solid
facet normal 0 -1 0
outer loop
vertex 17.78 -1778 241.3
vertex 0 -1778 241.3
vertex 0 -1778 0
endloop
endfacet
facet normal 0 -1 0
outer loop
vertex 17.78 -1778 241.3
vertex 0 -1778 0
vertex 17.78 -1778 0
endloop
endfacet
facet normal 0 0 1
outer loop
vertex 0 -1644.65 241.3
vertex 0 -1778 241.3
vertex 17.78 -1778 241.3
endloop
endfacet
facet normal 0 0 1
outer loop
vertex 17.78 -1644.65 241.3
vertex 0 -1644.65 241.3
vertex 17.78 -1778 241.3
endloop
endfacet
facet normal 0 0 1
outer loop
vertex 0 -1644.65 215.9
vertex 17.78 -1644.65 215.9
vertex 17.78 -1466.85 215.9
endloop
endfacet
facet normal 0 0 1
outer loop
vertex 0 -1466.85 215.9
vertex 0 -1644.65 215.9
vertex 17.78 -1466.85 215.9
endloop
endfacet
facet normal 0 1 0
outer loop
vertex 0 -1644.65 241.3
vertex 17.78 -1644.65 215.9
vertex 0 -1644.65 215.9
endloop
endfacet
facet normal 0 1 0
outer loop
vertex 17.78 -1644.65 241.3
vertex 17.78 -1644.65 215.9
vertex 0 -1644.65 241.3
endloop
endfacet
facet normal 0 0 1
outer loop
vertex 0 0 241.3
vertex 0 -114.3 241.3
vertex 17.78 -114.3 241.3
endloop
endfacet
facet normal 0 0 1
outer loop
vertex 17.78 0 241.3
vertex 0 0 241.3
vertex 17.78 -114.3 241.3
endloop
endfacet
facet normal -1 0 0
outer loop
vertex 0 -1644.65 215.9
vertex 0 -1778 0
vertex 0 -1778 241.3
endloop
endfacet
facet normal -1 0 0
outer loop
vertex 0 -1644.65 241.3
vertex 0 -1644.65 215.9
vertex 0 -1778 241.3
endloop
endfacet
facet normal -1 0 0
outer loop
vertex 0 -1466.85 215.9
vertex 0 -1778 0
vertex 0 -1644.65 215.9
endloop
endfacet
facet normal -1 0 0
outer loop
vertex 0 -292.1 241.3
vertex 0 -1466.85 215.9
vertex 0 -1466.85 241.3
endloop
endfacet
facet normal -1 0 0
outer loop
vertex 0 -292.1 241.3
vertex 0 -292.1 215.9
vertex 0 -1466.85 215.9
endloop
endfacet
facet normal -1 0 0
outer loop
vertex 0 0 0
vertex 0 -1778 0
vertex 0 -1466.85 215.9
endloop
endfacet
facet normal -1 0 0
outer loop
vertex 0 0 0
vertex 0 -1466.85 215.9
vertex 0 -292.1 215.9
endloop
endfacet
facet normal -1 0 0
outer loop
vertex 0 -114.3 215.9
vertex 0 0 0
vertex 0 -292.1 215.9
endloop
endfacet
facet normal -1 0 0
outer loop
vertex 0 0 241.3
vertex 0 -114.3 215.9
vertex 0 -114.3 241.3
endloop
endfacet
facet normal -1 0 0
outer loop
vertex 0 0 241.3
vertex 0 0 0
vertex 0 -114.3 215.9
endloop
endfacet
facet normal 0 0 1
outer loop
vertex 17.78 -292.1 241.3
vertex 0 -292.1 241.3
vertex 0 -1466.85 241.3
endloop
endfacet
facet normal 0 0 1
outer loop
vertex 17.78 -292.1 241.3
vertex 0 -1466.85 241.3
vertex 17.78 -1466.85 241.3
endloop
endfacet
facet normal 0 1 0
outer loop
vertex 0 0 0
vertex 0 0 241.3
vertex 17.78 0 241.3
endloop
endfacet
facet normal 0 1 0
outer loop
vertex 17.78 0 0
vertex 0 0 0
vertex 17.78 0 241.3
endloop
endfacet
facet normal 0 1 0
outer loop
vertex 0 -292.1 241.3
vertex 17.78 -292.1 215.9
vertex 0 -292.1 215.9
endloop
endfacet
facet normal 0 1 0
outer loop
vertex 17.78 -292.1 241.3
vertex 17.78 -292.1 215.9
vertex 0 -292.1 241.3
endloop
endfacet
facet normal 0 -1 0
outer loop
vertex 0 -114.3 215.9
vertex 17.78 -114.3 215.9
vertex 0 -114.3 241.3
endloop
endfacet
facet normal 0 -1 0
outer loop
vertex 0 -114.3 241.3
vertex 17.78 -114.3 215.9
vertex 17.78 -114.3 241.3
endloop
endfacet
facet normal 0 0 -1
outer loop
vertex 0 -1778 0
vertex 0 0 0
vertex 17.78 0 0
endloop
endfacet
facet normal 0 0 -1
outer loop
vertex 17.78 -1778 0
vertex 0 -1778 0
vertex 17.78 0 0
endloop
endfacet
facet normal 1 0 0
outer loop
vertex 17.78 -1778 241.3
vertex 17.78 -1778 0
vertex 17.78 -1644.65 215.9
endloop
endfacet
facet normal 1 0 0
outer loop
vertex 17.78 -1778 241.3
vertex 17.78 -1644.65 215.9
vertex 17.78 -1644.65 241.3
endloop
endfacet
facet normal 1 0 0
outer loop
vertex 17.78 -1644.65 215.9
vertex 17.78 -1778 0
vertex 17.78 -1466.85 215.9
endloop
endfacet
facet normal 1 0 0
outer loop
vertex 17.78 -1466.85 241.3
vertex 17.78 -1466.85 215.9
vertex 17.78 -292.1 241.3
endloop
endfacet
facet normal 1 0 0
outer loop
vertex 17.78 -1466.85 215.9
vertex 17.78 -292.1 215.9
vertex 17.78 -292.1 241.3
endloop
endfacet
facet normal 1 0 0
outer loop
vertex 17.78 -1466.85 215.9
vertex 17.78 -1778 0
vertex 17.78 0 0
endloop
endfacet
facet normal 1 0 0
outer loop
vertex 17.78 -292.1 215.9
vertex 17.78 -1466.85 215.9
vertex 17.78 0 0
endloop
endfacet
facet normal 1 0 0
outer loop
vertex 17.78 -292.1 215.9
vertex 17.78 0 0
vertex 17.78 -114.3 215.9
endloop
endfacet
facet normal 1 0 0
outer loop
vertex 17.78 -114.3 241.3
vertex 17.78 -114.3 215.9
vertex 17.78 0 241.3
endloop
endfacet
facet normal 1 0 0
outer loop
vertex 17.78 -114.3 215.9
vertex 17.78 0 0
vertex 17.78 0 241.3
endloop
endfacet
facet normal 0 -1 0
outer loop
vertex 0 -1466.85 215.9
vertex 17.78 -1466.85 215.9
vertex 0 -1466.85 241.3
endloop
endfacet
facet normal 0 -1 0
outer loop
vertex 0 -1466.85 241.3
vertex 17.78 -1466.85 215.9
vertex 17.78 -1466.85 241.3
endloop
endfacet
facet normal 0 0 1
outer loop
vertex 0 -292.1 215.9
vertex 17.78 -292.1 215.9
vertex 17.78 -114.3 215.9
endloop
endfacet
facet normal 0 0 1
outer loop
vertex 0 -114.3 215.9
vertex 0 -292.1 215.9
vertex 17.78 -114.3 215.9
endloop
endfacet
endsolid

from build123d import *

# Parameters (mm, degrees)
F0_W     = 17.78
F0_H     = 241.3
F1_DEPTH = 1778
F2_W     = 177.8
F2_H     = 25.4
F3_DEPTH = 17.781


with BuildPart() as f1:
    # F0 (on Front) → F1 (new body)
    with BuildSketch(Plane.XZ):
        with Locations((8.89, 120.65)):
            Rectangle(F0_W, F0_H)
    extrude(amount=F1_DEPTH)

    # F2 (on face) → F3 (cut, through all)
    with BuildSketch(Plane.YZ.offset(17.78)):
        with Locations((-203.2, 228.6)):
            Rectangle(F2_W, F2_H)
        with Locations((-1555.75, 228.6)):
            Rectangle(F2_W, F2_H)
    extrude(amount=-F3_DEPTH, mode=Mode.SUBTRACT)


solid = f1.part
